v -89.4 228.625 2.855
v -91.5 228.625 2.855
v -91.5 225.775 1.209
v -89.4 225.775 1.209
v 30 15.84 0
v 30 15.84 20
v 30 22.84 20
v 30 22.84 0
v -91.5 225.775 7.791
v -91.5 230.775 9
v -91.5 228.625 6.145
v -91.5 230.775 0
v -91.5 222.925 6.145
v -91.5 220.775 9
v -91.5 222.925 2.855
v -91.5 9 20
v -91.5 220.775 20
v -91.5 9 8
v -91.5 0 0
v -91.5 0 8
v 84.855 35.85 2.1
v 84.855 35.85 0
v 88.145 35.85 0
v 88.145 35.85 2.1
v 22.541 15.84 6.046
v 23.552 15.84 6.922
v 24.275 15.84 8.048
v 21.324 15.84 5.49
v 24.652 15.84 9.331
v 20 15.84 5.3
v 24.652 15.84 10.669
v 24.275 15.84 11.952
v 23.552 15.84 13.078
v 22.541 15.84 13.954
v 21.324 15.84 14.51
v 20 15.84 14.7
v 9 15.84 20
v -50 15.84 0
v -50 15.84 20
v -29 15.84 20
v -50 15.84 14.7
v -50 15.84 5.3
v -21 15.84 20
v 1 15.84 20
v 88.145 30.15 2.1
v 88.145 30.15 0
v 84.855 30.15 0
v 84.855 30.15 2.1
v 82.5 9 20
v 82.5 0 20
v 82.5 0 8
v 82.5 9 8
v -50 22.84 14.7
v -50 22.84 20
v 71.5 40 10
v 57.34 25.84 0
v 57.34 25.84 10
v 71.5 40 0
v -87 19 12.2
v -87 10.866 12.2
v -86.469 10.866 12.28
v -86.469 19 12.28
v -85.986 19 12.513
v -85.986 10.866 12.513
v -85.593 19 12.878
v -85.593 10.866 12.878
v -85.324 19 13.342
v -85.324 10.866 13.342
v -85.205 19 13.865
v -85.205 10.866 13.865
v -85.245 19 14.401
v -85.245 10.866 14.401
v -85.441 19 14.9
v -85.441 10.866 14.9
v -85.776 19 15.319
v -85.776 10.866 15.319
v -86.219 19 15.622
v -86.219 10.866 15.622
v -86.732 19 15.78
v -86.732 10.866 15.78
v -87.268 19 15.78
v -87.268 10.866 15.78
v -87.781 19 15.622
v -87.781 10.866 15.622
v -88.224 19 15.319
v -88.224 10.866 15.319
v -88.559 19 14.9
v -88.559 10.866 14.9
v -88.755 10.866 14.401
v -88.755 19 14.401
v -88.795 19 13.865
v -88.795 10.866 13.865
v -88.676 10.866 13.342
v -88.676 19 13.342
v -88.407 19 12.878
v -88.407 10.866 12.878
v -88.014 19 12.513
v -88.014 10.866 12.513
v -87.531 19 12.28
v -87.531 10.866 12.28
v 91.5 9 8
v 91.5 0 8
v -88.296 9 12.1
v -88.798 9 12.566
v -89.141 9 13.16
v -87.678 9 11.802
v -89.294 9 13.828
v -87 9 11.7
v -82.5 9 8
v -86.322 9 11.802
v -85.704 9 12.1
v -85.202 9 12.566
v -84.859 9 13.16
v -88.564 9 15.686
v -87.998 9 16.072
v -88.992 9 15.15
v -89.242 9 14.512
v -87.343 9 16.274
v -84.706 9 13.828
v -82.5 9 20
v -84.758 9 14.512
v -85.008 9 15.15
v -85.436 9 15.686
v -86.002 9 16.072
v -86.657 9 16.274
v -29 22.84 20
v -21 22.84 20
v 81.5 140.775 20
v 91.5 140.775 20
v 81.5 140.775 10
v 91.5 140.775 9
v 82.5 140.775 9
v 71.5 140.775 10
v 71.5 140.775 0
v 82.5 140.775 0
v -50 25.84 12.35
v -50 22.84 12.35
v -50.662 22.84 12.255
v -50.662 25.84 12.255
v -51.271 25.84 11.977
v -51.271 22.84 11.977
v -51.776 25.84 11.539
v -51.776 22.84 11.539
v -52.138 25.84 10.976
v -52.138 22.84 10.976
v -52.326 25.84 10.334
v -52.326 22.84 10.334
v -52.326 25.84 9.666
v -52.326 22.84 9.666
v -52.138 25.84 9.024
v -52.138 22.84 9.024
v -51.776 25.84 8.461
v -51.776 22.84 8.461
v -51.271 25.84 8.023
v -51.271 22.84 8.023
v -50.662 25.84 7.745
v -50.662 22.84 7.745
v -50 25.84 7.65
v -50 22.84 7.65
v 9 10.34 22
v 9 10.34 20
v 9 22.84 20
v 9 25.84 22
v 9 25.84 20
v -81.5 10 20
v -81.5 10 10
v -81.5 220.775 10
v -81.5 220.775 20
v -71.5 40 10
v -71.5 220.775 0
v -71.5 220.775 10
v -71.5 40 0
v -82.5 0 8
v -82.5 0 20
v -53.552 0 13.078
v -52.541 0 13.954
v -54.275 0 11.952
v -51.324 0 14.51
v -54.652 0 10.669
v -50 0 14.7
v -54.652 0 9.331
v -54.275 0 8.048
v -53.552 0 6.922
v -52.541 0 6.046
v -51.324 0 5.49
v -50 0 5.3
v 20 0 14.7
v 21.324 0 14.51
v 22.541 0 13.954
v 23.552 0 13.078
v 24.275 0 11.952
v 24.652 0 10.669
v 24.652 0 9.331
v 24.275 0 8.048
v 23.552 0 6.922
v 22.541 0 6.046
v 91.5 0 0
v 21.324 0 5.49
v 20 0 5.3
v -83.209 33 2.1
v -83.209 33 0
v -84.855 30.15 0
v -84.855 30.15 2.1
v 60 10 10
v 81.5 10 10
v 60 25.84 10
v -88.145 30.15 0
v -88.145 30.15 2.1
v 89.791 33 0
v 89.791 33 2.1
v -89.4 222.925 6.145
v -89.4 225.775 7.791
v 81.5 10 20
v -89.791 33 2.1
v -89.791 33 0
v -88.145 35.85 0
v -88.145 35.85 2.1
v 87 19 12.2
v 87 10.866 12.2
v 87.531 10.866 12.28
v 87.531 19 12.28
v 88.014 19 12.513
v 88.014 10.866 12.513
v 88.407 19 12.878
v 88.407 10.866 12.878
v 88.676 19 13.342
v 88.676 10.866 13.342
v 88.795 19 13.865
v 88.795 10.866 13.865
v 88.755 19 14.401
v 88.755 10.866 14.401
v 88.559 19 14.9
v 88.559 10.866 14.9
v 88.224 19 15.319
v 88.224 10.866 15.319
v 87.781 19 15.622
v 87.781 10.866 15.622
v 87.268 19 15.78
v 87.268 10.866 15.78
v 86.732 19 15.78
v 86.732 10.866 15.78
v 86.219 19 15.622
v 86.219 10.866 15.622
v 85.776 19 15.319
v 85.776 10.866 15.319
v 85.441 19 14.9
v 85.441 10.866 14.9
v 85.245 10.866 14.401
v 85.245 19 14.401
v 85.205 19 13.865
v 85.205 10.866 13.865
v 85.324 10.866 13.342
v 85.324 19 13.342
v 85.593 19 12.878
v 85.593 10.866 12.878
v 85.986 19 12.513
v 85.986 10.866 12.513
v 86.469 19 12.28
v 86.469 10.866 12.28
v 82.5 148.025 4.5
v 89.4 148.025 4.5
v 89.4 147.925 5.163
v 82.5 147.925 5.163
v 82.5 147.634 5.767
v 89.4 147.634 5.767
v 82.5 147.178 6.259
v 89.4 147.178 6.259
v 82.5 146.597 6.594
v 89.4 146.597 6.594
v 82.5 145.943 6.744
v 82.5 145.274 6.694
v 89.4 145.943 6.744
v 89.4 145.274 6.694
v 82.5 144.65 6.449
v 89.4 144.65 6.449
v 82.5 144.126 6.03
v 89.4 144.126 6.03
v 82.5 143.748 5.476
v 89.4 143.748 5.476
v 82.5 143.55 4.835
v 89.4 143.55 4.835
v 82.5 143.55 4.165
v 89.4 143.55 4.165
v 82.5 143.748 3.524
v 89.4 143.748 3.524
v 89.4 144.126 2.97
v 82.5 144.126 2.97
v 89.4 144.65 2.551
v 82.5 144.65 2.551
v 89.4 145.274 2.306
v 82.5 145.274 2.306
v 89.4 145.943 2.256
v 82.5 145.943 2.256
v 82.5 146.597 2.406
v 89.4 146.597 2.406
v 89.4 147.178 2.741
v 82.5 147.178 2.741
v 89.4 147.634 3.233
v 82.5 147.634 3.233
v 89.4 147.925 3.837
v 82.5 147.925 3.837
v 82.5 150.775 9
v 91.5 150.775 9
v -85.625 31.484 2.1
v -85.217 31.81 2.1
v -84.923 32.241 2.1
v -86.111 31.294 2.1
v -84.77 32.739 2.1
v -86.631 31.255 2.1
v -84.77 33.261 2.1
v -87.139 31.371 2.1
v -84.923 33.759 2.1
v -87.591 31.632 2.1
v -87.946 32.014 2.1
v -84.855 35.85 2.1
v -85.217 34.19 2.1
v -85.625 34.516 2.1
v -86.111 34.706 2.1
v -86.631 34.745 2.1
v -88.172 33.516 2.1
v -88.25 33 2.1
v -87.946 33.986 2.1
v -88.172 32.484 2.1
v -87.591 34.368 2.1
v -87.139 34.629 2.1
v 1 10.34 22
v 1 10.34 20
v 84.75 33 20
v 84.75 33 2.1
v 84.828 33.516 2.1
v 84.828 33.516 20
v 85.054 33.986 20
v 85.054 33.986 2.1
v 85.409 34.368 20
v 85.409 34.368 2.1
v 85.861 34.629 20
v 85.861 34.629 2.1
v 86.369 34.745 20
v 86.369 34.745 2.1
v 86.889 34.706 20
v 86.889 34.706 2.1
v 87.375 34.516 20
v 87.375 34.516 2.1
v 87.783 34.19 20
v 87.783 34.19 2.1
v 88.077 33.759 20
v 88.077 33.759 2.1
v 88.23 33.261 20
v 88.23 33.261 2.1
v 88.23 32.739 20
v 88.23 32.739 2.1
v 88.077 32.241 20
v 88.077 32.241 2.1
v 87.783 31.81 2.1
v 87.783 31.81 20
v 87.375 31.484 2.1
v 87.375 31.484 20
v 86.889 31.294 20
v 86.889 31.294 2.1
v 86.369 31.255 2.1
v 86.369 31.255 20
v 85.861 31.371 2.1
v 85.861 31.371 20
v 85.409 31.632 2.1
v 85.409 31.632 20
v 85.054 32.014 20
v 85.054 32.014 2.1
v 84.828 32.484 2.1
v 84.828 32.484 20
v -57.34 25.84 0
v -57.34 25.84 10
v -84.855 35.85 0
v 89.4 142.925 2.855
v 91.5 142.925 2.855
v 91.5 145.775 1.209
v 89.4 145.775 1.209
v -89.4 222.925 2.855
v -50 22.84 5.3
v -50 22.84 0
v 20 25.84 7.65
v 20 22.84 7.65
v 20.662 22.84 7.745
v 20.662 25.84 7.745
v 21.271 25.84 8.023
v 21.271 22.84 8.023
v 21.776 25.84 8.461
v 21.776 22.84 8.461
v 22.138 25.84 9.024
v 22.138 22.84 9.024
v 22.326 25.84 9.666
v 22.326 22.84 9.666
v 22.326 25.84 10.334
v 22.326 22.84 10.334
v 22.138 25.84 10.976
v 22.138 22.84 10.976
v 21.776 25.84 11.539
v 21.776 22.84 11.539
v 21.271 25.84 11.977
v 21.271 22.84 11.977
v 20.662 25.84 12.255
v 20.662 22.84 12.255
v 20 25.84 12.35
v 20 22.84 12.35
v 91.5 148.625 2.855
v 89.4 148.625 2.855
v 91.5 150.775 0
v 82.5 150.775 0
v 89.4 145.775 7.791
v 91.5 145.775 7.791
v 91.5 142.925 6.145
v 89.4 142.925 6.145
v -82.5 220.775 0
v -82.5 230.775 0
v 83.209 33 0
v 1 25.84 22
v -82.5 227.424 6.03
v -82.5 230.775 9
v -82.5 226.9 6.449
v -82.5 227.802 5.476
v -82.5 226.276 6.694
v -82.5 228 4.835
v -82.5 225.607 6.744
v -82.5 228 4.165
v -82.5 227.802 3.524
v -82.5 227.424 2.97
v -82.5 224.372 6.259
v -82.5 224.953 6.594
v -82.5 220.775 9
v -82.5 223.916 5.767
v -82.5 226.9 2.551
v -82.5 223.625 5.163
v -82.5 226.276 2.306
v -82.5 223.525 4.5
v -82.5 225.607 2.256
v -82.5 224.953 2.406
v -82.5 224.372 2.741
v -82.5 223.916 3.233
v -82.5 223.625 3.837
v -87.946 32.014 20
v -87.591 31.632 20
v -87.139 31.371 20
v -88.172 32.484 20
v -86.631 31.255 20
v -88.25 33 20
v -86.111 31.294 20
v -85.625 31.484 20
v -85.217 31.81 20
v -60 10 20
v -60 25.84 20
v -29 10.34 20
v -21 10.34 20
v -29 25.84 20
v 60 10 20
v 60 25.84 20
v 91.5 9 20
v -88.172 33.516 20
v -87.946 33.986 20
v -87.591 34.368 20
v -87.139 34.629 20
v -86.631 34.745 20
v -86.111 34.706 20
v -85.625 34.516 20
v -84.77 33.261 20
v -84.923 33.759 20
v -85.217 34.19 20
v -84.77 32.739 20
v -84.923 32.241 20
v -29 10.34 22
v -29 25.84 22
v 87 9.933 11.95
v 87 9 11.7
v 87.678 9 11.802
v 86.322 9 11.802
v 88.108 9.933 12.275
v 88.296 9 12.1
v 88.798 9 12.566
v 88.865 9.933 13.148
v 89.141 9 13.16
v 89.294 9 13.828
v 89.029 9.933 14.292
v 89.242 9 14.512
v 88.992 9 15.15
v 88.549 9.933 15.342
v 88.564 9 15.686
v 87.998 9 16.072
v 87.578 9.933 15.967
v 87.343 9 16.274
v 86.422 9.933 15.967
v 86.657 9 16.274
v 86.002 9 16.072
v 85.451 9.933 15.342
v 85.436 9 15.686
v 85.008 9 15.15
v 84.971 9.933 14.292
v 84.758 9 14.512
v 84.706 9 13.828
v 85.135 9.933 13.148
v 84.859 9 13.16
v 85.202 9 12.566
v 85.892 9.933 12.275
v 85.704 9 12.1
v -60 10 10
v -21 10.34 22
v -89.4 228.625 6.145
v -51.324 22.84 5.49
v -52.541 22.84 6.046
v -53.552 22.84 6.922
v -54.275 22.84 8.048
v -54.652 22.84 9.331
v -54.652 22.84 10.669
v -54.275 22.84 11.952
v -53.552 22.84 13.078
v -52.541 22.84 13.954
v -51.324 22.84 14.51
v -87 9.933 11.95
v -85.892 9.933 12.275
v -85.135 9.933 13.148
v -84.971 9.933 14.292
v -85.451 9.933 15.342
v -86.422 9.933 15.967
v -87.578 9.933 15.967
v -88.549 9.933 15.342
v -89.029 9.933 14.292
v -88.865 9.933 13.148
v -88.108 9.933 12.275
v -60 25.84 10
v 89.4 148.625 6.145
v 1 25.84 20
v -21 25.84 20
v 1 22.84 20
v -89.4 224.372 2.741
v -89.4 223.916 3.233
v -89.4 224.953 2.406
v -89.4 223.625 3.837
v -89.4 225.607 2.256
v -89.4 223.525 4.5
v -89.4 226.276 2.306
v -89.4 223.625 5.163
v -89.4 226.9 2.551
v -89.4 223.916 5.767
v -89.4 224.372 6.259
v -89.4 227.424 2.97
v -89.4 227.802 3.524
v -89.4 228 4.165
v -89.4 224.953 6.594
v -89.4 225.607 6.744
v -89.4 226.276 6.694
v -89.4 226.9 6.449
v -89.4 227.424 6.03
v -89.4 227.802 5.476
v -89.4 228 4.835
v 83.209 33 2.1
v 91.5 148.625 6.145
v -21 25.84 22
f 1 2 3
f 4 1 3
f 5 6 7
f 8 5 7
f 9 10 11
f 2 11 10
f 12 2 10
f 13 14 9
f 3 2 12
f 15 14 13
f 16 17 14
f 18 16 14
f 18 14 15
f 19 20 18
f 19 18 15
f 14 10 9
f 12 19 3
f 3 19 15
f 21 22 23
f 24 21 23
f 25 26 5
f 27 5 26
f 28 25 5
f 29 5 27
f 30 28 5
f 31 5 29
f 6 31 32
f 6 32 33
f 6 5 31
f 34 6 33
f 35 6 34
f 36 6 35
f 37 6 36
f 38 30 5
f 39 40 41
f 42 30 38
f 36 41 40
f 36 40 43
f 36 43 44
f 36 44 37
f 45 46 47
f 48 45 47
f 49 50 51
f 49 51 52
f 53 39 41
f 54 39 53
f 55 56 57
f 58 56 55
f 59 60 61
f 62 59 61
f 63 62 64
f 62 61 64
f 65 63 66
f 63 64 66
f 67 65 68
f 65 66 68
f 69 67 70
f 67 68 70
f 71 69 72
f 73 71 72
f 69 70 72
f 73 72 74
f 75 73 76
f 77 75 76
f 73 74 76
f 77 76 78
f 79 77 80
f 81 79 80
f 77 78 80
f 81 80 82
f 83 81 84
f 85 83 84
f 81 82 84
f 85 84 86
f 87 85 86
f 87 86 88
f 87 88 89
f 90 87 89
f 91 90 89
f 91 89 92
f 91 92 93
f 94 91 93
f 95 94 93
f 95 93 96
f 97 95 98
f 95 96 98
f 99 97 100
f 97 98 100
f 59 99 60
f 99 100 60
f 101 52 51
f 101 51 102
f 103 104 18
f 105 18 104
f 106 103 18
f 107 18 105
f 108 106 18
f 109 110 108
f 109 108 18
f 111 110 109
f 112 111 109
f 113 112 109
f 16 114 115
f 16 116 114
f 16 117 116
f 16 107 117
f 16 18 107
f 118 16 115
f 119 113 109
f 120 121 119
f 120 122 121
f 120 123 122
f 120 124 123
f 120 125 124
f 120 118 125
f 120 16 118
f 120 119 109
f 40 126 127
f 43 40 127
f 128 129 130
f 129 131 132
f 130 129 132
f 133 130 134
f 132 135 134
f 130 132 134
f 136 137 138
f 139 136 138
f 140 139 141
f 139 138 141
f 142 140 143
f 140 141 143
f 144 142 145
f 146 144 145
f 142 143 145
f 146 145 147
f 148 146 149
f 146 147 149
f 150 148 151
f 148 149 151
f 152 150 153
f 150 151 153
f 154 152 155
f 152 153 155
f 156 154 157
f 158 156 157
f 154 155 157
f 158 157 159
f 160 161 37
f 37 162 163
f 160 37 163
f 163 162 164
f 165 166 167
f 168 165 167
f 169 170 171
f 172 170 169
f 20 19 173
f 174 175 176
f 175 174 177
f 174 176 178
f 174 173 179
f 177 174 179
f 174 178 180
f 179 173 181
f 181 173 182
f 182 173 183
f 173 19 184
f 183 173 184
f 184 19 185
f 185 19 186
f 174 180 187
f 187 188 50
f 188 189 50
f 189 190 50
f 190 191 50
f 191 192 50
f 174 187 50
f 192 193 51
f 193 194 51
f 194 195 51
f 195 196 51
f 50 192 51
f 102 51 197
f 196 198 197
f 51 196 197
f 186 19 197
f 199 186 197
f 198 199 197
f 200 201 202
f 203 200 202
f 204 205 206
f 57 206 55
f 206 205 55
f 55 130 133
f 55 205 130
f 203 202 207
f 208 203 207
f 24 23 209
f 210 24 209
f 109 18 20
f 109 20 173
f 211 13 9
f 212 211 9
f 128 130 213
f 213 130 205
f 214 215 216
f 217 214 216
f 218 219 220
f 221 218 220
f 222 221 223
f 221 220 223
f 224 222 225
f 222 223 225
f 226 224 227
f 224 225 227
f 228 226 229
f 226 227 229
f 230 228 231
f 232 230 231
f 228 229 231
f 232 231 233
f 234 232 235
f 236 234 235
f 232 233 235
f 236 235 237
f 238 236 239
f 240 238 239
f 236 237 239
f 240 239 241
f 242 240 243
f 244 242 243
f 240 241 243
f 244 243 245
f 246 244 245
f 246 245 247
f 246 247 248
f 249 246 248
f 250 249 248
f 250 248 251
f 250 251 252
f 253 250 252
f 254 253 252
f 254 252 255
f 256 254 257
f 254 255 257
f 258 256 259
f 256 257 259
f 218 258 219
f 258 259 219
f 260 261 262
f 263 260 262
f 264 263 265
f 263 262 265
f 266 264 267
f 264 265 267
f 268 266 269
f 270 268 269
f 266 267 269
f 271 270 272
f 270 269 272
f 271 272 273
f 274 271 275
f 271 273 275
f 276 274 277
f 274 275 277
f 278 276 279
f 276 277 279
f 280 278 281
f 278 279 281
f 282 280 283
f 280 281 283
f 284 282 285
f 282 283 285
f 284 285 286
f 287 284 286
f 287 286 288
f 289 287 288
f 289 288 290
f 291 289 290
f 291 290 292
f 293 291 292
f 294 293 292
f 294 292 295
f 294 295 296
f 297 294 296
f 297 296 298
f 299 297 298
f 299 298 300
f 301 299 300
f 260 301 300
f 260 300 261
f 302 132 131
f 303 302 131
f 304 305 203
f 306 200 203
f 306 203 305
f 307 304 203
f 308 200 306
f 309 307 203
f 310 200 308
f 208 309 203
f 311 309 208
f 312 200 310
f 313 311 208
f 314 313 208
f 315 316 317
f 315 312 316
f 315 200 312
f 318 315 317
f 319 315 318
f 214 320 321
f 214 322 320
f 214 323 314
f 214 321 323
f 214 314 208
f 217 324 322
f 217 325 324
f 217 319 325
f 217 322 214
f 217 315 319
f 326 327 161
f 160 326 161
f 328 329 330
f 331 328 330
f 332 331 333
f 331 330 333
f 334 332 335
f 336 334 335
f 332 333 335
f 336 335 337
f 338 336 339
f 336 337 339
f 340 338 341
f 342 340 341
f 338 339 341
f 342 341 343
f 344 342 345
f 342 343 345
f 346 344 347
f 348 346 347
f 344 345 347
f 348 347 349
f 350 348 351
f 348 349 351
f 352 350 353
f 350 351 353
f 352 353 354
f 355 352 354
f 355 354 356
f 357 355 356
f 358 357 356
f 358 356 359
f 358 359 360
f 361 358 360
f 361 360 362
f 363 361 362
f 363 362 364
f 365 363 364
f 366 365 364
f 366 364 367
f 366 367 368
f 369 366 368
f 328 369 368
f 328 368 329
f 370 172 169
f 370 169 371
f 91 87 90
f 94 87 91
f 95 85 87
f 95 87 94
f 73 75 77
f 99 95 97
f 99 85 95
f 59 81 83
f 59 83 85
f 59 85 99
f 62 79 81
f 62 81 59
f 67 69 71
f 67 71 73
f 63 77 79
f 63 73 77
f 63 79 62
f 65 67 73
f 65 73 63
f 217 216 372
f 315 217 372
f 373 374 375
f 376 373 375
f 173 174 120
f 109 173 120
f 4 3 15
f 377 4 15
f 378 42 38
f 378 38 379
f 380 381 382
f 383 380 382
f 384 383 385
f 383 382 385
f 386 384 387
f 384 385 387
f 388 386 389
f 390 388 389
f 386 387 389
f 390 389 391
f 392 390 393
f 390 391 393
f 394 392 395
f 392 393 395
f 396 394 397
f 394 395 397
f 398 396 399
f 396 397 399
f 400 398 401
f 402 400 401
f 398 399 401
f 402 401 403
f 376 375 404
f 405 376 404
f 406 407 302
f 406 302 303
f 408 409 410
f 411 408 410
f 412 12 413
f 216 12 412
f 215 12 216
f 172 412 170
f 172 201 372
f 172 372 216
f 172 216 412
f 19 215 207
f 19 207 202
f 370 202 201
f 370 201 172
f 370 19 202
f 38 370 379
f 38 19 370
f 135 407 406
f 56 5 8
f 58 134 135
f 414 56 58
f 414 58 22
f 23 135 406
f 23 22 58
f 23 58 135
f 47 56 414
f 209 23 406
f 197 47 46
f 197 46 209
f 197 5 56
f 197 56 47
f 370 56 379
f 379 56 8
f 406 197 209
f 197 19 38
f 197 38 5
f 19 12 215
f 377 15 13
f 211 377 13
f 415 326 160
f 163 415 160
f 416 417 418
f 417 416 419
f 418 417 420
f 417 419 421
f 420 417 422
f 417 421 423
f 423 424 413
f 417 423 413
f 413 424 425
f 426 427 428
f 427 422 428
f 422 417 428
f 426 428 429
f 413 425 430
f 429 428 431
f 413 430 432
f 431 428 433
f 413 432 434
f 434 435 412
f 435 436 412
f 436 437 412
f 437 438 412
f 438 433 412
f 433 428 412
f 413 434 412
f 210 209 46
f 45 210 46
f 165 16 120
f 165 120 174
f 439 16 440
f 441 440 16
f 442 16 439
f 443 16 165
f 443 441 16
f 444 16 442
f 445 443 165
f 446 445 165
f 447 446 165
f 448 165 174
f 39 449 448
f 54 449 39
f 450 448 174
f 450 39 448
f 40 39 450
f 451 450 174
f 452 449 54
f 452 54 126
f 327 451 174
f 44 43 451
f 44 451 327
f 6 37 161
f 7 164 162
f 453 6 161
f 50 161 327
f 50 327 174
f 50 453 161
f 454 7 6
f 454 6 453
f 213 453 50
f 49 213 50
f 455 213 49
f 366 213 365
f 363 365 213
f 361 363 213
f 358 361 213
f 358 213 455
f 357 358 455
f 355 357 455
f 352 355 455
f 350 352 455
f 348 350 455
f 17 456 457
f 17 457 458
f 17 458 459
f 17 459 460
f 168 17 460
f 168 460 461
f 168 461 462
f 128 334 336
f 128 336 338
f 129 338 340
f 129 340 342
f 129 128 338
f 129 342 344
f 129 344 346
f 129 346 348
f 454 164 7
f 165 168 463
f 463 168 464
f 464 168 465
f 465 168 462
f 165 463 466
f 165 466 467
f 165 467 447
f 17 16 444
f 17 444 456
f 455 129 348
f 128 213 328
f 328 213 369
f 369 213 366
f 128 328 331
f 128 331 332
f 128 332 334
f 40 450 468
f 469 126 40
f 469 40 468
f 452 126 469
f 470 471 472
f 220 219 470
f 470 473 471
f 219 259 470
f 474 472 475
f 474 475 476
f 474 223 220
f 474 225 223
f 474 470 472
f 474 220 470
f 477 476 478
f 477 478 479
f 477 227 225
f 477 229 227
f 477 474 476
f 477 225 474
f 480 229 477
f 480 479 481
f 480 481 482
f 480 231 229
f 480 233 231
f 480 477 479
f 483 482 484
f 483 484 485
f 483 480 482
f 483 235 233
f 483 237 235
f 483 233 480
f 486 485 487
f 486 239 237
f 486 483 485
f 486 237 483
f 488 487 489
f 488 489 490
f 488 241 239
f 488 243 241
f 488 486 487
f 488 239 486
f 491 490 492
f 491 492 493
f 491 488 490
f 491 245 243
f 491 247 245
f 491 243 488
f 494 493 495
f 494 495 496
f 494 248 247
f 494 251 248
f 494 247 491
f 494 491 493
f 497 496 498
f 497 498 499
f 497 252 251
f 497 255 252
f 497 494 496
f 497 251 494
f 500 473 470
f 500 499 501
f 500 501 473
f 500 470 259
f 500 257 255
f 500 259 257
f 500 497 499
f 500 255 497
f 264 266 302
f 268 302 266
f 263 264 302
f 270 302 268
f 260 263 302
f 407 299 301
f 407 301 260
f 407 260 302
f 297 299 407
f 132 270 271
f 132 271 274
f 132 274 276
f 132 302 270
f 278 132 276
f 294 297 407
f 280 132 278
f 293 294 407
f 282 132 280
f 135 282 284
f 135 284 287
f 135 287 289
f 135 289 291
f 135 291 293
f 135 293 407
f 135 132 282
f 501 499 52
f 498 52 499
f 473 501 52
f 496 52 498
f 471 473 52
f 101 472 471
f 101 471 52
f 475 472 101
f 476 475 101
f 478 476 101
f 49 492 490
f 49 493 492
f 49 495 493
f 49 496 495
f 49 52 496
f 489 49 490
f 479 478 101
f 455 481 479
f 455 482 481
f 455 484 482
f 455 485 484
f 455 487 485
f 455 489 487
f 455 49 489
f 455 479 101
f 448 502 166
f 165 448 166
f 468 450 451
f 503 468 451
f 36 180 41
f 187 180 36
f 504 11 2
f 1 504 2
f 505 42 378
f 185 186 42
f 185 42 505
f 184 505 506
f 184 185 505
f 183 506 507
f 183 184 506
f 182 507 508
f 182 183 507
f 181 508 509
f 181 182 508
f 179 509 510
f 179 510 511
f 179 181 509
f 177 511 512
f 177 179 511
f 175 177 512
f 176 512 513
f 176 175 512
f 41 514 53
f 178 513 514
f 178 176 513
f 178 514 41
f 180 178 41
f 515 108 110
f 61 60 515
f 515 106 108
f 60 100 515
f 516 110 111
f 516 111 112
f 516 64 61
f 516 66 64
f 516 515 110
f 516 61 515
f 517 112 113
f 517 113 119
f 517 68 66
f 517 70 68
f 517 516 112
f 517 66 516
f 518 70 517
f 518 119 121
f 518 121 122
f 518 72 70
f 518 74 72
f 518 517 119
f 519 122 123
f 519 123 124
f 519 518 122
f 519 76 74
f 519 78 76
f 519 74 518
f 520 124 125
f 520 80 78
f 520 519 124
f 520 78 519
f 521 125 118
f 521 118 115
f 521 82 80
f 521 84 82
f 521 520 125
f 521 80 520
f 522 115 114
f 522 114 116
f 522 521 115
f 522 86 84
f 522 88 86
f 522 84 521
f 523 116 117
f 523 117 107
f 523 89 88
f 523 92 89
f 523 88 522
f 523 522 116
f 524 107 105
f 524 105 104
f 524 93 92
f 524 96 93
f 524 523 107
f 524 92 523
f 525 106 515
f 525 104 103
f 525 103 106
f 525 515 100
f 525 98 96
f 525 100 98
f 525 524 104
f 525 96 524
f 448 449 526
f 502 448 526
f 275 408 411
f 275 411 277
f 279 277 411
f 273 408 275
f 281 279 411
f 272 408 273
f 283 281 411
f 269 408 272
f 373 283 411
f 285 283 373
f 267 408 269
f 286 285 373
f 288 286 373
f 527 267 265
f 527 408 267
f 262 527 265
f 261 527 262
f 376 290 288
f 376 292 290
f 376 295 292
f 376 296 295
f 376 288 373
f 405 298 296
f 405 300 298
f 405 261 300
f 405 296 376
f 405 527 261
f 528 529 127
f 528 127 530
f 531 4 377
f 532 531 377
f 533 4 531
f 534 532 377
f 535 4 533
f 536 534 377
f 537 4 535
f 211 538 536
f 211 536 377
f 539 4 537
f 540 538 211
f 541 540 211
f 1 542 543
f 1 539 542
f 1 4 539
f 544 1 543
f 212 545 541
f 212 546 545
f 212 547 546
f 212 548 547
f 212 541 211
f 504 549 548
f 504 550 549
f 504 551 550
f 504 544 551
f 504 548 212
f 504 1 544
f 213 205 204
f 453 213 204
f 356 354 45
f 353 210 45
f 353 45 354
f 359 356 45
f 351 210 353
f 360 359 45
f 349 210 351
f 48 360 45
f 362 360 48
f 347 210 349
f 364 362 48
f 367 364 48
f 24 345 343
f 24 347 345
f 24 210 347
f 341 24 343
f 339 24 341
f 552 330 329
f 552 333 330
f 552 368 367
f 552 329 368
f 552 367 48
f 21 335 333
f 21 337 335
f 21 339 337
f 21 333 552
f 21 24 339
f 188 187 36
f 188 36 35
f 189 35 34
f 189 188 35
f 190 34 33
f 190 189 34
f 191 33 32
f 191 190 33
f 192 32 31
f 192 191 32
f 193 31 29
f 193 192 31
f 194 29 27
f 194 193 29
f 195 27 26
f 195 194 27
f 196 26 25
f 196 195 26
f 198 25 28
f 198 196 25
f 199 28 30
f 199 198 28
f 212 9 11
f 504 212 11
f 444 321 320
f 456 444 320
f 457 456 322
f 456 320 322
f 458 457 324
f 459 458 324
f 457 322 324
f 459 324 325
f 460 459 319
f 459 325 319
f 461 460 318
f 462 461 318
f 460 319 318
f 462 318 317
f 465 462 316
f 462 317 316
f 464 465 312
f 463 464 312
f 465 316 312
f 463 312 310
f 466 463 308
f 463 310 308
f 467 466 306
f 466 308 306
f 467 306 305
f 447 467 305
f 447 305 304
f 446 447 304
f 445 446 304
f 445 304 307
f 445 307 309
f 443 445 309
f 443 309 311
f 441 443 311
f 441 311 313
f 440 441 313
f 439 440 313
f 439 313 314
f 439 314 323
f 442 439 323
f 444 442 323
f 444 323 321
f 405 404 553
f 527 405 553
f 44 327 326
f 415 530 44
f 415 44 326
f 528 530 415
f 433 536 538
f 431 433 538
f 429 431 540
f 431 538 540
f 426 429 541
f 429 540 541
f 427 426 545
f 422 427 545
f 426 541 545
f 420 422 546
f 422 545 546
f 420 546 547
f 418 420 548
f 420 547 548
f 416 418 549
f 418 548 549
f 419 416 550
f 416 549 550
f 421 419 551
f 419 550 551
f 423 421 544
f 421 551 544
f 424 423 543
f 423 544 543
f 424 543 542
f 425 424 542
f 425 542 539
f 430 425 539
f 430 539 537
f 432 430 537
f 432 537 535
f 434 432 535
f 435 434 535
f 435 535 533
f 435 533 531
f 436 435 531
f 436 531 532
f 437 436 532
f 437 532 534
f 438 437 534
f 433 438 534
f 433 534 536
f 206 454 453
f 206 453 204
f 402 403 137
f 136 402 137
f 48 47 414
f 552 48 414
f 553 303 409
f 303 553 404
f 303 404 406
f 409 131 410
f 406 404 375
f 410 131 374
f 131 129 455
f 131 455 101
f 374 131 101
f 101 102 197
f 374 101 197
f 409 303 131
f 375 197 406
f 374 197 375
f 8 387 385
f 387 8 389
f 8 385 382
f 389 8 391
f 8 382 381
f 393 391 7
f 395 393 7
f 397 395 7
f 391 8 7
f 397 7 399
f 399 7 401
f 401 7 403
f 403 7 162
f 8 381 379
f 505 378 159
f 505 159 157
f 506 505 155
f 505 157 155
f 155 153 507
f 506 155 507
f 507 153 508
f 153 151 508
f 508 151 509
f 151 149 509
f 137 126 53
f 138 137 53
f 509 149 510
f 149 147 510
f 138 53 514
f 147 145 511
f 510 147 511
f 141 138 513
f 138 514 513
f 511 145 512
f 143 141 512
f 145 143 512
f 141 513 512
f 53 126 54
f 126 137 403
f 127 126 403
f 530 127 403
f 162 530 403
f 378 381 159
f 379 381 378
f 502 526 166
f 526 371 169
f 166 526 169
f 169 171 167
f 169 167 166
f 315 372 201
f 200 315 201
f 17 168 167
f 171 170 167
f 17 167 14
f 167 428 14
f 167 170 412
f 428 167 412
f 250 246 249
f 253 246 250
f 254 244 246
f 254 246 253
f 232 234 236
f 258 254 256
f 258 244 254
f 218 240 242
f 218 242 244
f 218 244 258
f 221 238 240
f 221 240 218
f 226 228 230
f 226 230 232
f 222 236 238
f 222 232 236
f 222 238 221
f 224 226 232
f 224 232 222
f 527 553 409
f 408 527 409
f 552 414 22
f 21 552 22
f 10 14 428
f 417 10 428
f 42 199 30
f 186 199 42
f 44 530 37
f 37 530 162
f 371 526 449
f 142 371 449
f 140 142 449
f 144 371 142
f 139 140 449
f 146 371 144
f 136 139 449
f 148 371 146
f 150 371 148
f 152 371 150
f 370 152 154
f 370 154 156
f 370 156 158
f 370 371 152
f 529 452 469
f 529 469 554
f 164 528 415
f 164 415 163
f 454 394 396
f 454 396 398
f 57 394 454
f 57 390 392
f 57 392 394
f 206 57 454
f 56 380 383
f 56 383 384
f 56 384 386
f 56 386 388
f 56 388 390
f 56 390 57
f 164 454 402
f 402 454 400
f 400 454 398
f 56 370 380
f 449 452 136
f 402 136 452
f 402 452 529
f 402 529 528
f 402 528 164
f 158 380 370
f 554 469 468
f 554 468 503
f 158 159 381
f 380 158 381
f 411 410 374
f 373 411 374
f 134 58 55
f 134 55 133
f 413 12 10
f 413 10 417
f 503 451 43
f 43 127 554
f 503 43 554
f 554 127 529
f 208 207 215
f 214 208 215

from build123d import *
from OCP.BRepFilletAPI import BRepFilletAPI_MakeChamfer

# Parameters (mm, degrees)
BOSS_EXTRUDE1_DEPTH             = 10
BOSS_EXTRUDE2_DEPTH             = 10
SKETCH3_W                       = 9
SKETCH3_H                       = 9
BOSS_EXTRUDE3_DEPTH             = 10
SKETCH5_W                       = 9
SKETCH5_H                       = 9
BOSS_EXTRUDE4_DEPTH             = 10
SKETCH6_R                       = 2.25
CUT_EXTRUDE1_DEPTH              = 9
SKETCH7_R                       = 2.25
CUT_EXTRUDE2_DEPTH              = 9
SKETCH8_R                       = 1.75
CUT_EXTRUDE3_DEPTH              = 250.05692246
CUT_EXTRUDE4_DEPTH              = 2.1
SKETCH10_W                      = 9
SKETCH10_H                      = 9
CUT_EXTRUDE5_DEPTH              = 12
SKETCH11_R                      = 1.8
CUT_EXTRUDE6_DEPTH              = 10
CHAMFER1_SIZE                   = 0.5
CHAMFER1_SIZE2                  = 1.866025404
CUT_EXTRUDE7_DEPTH              = 2.1
CUT_EXTRUDE8_DEPTH              = 2.1
SKETCH14_W                      = 120
SKETCH14_H                      = 20
BOSS_EXTRUDE5_DEPTH             = 5.84
BOSS_EXTRUDE5_DIRECTION_2_REACH = 232.648
CUT_EXTRUDE9_START              = -20
SKETCH15_W                      = 80
SKETCH15_H                      = 7
CUT_EXTRUDE9_DEPTH              = 20
CUT_EXTRUDE10_START             = -15.84
CUT_EXTRUDE10_DEPTH             = 22.84
SKETCH17_W                      = 8
SKETCH17_H                      = 15.5
BOSS_EXTRUDE6_DEPTH             = 2


with BuildPart() as part:
    # Sketch1 → Boss-Extrude1 (new body)
    with BuildSketch(Plane.XY):
        Polygon((0, 0), (-91.5, 0), (-91.5, 220.775), (-71.5, 220.775), (-71.5, 40), (-51.5, 20), (0, 20), (51.5, 20), (71.5, 40), (71.5, 140.775), (91.5, 140.775), (91.5, 0), align=None)
    extrude(amount=BOSS_EXTRUDE1_DEPTH)

    # Sketch2 → Boss-Extrude2 (add)
    with BuildSketch(Plane.XY.offset(10)):
        Polygon((-81.5, 220.775), (-91.5, 220.775), (-91.5, 0), (91.5, 0), (91.5, 140.775), (81.5, 140.775), (81.5, 10), (-81.5, 10), align=None)
    extrude(amount=BOSS_EXTRUDE2_DEPTH)

    # Sketch3 → Boss-Extrude3 (add)
    with BuildSketch(Plane(origin=(0, 220.775, 0), x_dir=(1, 0, 0), z_dir=(0, 1, 0))):
        with Locations((-87, -4.5)):
            Rectangle(SKETCH3_W, SKETCH3_H)
    extrude(amount=BOSS_EXTRUDE3_DEPTH)

    # Sketch5 → Boss-Extrude4 (add)
    with BuildSketch(Plane(origin=(0, 140.775, 0), x_dir=(1, 0, 0), z_dir=(0, 1, 0))):
        with Locations((87, -4.5)):
            Rectangle(SKETCH5_W, SKETCH5_H)
    extrude(amount=BOSS_EXTRUDE4_DEPTH)

    # Sketch6 → Cut-Extrude1 (cut)
    with BuildSketch(Plane.ZY.offset(91.5)):
        with Locations(Location((4.5, 225.775, 0), (0, 0, 270))):
            Circle(SKETCH6_R)
    extrude(amount=-CUT_EXTRUDE1_DEPTH, mode=Mode.SUBTRACT)

    # Sketch7 → Cut-Extrude2 (cut)
    with BuildSketch(Plane(origin=(91.5, 0, 0), x_dir=(0, 0, -1), z_dir=(1, 0, 0))):
        with Locations(Location((-4.5, 145.775, 0), (0, 0, 90))):
            Circle(SKETCH7_R)
    extrude(amount=-CUT_EXTRUDE2_DEPTH, mode=Mode.SUBTRACT)

    # Sketch8 → Cut-Extrude3 (cut, through all)
    with BuildSketch(Plane(origin=(0, 0, 0), x_dir=(-1, 0, 0), z_dir=(0, 0, -1))):
        with Locations((86.5, 33)):
            Circle(SKETCH8_R)
        with Locations((-86.5, 33)):
            Circle(SKETCH8_R)
    extrude(amount=-CUT_EXTRUDE3_DEPTH, mode=Mode.SUBTRACT)

    # Sketch9 → Cut-Extrude4 (cut)
    with BuildSketch(Plane(origin=(0, 0, 0), x_dir=(-1, 0, 0), z_dir=(0, 0, -1))):
        Polygon((-84.854551733, 30.15), (-83.209103466, 33), (-84.854551733, 35.85), (-88.145448267, 35.85), (-89.790896534, 33), (-88.145448267, 30.15), align=None)
        Polygon((88.145448267, 30.15), (89.790896534, 33), (88.145448267, 35.85), (84.854551733, 35.85), (83.209103466, 33), (84.854551733, 30.15), align=None)
    extrude(amount=-CUT_EXTRUDE4_DEPTH, mode=Mode.SUBTRACT)

    # Sketch10 → Cut-Extrude5 (cut)
    with BuildSketch(Plane.XY.offset(20)):
        with Locations((87, 4.5)):
            Rectangle(SKETCH10_W, SKETCH10_H)
        with Locations((-87, 4.5)):
            Rectangle(SKETCH10_W, SKETCH10_H)
    extrude(amount=-CUT_EXTRUDE5_DEPTH, mode=Mode.SUBTRACT)

    # Sketch11 → Cut-Extrude6 (cut)
    with BuildSketch(Plane.XZ.offset(-9)):
        with Locations(Location((-87, 14, 0), (0, 0, 270))):
            Circle(SKETCH11_R)
        with Locations(Location((87, 14, 0), (0, 0, 270))):
            Circle(SKETCH11_R)
    extrude(amount=-CUT_EXTRUDE6_DEPTH, mode=Mode.SUBTRACT)

    # Chamfer1: one chamfer whose edges measure the first distance from different faces: ONE call of the kernel's chamfer builder (chamfer() names one face for all edges)
    chamfer1_edges_1 = [part.edges().sort_by_distance(p)[0] for p in [
        (-87, 9, 15.8),
    ]]
    chamfer1_side_1 = [part.faces().sort_by_distance(p)[0] for p in [
        (-91.35, 9, 14),
    ]]
    chamfer1_edges_2 = [part.edges().sort_by_distance(p)[0] for p in [
        (87, 9, 15.8),
    ]]
    chamfer1_side_2 = [part.faces().sort_by_distance(p)[0] for p in [
        (82.65, 9, 14),
    ]]
    chamfer1 = BRepFilletAPI_MakeChamfer(part.part.solid().wrapped)
    for e in chamfer1_edges_1:
        chamfer1.Add(CHAMFER1_SIZE, CHAMFER1_SIZE2, e.wrapped, chamfer1_side_1[0].wrapped)  # the first distance lies on this face
    for e in chamfer1_edges_2:
        chamfer1.Add(CHAMFER1_SIZE, CHAMFER1_SIZE2, e.wrapped, chamfer1_side_2[0].wrapped)  # the first distance lies on this face
    add(Compound.cast(chamfer1.Shape()), mode=Mode.REPLACE)

    # Sketch12 → Cut-Extrude7 (cut)
    with BuildSketch(Plane.ZY.offset(91.5)):
        Polygon((6.145448267, 222.925), (7.790896534, 225.775), (6.145448267, 228.625), (2.854551733, 228.625), (1.209103466, 225.775), (2.854551733, 222.925), align=None)
    extrude(amount=-CUT_EXTRUDE7_DEPTH, mode=Mode.SUBTRACT)

    # Sketch13 → Cut-Extrude8 (cut)
    with BuildSketch(Plane(origin=(91.5, 0, 0), x_dir=(0, 0, -1), z_dir=(1, 0, 0))):
        Polygon((-2.854551733, 142.925), (-1.209103466, 145.775), (-2.854551733, 148.625), (-6.145448267, 148.625), (-7.790896534, 145.775), (-6.145448267, 142.925), align=None)
    extrude(amount=-CUT_EXTRUDE8_DEPTH, mode=Mode.SUBTRACT)

    # Sketch14 → Boss-Extrude5 (add)
    with BuildSketch(Plane(origin=(0, 20, 0), x_dir=(1, 0, 0), z_dir=(0, 1, 0))):
        with Locations((0, -10)):
            Rectangle(SKETCH14_W, SKETCH14_H)
        with BuildLine():
            Line((-50, -7.65), (20, -7.65))
            ThreePointArc((20, -7.65), (22.35, -10), (20, -12.35))
            Line((20, -12.35), (-50, -12.35))
            ThreePointArc((-50, -12.35), (-52.35, -10), (-50, -7.65))
        make_face(mode=Mode.SUBTRACT)
    extrude(amount=BOSS_EXTRUDE5_DEPTH)

    # Boss-Extrude5 direction 2: up to this face of the body (flat: up to its plane)
    boss_extrude5_direction_2_end = Plane(part.part.faces().sort_by_distance((0, 10, 15))[0])
    # Sketch14 → Boss-Extrude5 direction 2 (add, up to the picked face)
    with BuildSketch(Plane(origin=(0, 20, 0), x_dir=(1, 0, 0), z_dir=(0, 1, 0)), mode=Mode.PRIVATE) as boss_extrude5_direction_2_sk1:
        with Locations((0, -10)):
            Rectangle(SKETCH14_W, SKETCH14_H)
        with BuildLine():
            Line((-50, -7.65), (20, -7.65))
            ThreePointArc((20, -7.65), (22.35, -10), (20, -12.35))
            Line((20, -12.35), (-50, -12.35))
            ThreePointArc((-50, -12.35), (-52.35, -10), (-50, -7.65))
        make_face(mode=Mode.SUBTRACT)
    boss_extrude5_direction_2_tool1 = split(extrude(boss_extrude5_direction_2_sk1.sketch, amount=-BOSS_EXTRUDE5_DIRECTION_2_REACH, mode=Mode.PRIVATE), bisect_by=boss_extrude5_direction_2_end, keep=Keep.BOTH, mode=Mode.PRIVATE)
    add(boss_extrude5_direction_2_tool1.solids().sort_by(Axis((0, 20, 18.783447), (0, -1, 0)))[0])

    # Sketch15 → Cut-Extrude9 (cut)
    with BuildSketch(Plane(origin=(0, 0, 0), x_dir=(-1, 0, 0), z_dir=(0, 0, -1)).offset(CUT_EXTRUDE9_START)):
        with Locations((10, 19.34)):
            Rectangle(SKETCH15_W, SKETCH15_H)
    extrude(amount=CUT_EXTRUDE9_DEPTH, mode=Mode.SUBTRACT)

    # Sketch16 → Cut-Extrude10 (cut)
    with BuildSketch(Plane(origin=(0, 15.84, 0), x_dir=(1, 0, 0), z_dir=(0, 1, 0)).offset(CUT_EXTRUDE10_START)):
        with BuildLine():
            Line((20, -5.3), (-50, -5.3))
            ThreePointArc((-50, -5.3), (-54.7, -10), (-50, -14.7))
            Line((-50, -14.7), (20, -14.7))
            ThreePointArc((20, -14.7), (24.7, -10), (20, -5.3))
        make_face()
    extrude(amount=CUT_EXTRUDE10_DEPTH, mode=Mode.SUBTRACT)

    # Sketch17 → Boss-Extrude6 (add)
    with BuildSketch(Plane.XY.offset(20)):
        with Locations((-25, 18.09)):
            Rectangle(SKETCH17_W, SKETCH17_H)
        with Locations((5, 18.09)):
            Rectangle(SKETCH17_W, SKETCH17_H)
    extrude(amount=BOSS_EXTRUDE6_DEPTH)


solid = part.part
